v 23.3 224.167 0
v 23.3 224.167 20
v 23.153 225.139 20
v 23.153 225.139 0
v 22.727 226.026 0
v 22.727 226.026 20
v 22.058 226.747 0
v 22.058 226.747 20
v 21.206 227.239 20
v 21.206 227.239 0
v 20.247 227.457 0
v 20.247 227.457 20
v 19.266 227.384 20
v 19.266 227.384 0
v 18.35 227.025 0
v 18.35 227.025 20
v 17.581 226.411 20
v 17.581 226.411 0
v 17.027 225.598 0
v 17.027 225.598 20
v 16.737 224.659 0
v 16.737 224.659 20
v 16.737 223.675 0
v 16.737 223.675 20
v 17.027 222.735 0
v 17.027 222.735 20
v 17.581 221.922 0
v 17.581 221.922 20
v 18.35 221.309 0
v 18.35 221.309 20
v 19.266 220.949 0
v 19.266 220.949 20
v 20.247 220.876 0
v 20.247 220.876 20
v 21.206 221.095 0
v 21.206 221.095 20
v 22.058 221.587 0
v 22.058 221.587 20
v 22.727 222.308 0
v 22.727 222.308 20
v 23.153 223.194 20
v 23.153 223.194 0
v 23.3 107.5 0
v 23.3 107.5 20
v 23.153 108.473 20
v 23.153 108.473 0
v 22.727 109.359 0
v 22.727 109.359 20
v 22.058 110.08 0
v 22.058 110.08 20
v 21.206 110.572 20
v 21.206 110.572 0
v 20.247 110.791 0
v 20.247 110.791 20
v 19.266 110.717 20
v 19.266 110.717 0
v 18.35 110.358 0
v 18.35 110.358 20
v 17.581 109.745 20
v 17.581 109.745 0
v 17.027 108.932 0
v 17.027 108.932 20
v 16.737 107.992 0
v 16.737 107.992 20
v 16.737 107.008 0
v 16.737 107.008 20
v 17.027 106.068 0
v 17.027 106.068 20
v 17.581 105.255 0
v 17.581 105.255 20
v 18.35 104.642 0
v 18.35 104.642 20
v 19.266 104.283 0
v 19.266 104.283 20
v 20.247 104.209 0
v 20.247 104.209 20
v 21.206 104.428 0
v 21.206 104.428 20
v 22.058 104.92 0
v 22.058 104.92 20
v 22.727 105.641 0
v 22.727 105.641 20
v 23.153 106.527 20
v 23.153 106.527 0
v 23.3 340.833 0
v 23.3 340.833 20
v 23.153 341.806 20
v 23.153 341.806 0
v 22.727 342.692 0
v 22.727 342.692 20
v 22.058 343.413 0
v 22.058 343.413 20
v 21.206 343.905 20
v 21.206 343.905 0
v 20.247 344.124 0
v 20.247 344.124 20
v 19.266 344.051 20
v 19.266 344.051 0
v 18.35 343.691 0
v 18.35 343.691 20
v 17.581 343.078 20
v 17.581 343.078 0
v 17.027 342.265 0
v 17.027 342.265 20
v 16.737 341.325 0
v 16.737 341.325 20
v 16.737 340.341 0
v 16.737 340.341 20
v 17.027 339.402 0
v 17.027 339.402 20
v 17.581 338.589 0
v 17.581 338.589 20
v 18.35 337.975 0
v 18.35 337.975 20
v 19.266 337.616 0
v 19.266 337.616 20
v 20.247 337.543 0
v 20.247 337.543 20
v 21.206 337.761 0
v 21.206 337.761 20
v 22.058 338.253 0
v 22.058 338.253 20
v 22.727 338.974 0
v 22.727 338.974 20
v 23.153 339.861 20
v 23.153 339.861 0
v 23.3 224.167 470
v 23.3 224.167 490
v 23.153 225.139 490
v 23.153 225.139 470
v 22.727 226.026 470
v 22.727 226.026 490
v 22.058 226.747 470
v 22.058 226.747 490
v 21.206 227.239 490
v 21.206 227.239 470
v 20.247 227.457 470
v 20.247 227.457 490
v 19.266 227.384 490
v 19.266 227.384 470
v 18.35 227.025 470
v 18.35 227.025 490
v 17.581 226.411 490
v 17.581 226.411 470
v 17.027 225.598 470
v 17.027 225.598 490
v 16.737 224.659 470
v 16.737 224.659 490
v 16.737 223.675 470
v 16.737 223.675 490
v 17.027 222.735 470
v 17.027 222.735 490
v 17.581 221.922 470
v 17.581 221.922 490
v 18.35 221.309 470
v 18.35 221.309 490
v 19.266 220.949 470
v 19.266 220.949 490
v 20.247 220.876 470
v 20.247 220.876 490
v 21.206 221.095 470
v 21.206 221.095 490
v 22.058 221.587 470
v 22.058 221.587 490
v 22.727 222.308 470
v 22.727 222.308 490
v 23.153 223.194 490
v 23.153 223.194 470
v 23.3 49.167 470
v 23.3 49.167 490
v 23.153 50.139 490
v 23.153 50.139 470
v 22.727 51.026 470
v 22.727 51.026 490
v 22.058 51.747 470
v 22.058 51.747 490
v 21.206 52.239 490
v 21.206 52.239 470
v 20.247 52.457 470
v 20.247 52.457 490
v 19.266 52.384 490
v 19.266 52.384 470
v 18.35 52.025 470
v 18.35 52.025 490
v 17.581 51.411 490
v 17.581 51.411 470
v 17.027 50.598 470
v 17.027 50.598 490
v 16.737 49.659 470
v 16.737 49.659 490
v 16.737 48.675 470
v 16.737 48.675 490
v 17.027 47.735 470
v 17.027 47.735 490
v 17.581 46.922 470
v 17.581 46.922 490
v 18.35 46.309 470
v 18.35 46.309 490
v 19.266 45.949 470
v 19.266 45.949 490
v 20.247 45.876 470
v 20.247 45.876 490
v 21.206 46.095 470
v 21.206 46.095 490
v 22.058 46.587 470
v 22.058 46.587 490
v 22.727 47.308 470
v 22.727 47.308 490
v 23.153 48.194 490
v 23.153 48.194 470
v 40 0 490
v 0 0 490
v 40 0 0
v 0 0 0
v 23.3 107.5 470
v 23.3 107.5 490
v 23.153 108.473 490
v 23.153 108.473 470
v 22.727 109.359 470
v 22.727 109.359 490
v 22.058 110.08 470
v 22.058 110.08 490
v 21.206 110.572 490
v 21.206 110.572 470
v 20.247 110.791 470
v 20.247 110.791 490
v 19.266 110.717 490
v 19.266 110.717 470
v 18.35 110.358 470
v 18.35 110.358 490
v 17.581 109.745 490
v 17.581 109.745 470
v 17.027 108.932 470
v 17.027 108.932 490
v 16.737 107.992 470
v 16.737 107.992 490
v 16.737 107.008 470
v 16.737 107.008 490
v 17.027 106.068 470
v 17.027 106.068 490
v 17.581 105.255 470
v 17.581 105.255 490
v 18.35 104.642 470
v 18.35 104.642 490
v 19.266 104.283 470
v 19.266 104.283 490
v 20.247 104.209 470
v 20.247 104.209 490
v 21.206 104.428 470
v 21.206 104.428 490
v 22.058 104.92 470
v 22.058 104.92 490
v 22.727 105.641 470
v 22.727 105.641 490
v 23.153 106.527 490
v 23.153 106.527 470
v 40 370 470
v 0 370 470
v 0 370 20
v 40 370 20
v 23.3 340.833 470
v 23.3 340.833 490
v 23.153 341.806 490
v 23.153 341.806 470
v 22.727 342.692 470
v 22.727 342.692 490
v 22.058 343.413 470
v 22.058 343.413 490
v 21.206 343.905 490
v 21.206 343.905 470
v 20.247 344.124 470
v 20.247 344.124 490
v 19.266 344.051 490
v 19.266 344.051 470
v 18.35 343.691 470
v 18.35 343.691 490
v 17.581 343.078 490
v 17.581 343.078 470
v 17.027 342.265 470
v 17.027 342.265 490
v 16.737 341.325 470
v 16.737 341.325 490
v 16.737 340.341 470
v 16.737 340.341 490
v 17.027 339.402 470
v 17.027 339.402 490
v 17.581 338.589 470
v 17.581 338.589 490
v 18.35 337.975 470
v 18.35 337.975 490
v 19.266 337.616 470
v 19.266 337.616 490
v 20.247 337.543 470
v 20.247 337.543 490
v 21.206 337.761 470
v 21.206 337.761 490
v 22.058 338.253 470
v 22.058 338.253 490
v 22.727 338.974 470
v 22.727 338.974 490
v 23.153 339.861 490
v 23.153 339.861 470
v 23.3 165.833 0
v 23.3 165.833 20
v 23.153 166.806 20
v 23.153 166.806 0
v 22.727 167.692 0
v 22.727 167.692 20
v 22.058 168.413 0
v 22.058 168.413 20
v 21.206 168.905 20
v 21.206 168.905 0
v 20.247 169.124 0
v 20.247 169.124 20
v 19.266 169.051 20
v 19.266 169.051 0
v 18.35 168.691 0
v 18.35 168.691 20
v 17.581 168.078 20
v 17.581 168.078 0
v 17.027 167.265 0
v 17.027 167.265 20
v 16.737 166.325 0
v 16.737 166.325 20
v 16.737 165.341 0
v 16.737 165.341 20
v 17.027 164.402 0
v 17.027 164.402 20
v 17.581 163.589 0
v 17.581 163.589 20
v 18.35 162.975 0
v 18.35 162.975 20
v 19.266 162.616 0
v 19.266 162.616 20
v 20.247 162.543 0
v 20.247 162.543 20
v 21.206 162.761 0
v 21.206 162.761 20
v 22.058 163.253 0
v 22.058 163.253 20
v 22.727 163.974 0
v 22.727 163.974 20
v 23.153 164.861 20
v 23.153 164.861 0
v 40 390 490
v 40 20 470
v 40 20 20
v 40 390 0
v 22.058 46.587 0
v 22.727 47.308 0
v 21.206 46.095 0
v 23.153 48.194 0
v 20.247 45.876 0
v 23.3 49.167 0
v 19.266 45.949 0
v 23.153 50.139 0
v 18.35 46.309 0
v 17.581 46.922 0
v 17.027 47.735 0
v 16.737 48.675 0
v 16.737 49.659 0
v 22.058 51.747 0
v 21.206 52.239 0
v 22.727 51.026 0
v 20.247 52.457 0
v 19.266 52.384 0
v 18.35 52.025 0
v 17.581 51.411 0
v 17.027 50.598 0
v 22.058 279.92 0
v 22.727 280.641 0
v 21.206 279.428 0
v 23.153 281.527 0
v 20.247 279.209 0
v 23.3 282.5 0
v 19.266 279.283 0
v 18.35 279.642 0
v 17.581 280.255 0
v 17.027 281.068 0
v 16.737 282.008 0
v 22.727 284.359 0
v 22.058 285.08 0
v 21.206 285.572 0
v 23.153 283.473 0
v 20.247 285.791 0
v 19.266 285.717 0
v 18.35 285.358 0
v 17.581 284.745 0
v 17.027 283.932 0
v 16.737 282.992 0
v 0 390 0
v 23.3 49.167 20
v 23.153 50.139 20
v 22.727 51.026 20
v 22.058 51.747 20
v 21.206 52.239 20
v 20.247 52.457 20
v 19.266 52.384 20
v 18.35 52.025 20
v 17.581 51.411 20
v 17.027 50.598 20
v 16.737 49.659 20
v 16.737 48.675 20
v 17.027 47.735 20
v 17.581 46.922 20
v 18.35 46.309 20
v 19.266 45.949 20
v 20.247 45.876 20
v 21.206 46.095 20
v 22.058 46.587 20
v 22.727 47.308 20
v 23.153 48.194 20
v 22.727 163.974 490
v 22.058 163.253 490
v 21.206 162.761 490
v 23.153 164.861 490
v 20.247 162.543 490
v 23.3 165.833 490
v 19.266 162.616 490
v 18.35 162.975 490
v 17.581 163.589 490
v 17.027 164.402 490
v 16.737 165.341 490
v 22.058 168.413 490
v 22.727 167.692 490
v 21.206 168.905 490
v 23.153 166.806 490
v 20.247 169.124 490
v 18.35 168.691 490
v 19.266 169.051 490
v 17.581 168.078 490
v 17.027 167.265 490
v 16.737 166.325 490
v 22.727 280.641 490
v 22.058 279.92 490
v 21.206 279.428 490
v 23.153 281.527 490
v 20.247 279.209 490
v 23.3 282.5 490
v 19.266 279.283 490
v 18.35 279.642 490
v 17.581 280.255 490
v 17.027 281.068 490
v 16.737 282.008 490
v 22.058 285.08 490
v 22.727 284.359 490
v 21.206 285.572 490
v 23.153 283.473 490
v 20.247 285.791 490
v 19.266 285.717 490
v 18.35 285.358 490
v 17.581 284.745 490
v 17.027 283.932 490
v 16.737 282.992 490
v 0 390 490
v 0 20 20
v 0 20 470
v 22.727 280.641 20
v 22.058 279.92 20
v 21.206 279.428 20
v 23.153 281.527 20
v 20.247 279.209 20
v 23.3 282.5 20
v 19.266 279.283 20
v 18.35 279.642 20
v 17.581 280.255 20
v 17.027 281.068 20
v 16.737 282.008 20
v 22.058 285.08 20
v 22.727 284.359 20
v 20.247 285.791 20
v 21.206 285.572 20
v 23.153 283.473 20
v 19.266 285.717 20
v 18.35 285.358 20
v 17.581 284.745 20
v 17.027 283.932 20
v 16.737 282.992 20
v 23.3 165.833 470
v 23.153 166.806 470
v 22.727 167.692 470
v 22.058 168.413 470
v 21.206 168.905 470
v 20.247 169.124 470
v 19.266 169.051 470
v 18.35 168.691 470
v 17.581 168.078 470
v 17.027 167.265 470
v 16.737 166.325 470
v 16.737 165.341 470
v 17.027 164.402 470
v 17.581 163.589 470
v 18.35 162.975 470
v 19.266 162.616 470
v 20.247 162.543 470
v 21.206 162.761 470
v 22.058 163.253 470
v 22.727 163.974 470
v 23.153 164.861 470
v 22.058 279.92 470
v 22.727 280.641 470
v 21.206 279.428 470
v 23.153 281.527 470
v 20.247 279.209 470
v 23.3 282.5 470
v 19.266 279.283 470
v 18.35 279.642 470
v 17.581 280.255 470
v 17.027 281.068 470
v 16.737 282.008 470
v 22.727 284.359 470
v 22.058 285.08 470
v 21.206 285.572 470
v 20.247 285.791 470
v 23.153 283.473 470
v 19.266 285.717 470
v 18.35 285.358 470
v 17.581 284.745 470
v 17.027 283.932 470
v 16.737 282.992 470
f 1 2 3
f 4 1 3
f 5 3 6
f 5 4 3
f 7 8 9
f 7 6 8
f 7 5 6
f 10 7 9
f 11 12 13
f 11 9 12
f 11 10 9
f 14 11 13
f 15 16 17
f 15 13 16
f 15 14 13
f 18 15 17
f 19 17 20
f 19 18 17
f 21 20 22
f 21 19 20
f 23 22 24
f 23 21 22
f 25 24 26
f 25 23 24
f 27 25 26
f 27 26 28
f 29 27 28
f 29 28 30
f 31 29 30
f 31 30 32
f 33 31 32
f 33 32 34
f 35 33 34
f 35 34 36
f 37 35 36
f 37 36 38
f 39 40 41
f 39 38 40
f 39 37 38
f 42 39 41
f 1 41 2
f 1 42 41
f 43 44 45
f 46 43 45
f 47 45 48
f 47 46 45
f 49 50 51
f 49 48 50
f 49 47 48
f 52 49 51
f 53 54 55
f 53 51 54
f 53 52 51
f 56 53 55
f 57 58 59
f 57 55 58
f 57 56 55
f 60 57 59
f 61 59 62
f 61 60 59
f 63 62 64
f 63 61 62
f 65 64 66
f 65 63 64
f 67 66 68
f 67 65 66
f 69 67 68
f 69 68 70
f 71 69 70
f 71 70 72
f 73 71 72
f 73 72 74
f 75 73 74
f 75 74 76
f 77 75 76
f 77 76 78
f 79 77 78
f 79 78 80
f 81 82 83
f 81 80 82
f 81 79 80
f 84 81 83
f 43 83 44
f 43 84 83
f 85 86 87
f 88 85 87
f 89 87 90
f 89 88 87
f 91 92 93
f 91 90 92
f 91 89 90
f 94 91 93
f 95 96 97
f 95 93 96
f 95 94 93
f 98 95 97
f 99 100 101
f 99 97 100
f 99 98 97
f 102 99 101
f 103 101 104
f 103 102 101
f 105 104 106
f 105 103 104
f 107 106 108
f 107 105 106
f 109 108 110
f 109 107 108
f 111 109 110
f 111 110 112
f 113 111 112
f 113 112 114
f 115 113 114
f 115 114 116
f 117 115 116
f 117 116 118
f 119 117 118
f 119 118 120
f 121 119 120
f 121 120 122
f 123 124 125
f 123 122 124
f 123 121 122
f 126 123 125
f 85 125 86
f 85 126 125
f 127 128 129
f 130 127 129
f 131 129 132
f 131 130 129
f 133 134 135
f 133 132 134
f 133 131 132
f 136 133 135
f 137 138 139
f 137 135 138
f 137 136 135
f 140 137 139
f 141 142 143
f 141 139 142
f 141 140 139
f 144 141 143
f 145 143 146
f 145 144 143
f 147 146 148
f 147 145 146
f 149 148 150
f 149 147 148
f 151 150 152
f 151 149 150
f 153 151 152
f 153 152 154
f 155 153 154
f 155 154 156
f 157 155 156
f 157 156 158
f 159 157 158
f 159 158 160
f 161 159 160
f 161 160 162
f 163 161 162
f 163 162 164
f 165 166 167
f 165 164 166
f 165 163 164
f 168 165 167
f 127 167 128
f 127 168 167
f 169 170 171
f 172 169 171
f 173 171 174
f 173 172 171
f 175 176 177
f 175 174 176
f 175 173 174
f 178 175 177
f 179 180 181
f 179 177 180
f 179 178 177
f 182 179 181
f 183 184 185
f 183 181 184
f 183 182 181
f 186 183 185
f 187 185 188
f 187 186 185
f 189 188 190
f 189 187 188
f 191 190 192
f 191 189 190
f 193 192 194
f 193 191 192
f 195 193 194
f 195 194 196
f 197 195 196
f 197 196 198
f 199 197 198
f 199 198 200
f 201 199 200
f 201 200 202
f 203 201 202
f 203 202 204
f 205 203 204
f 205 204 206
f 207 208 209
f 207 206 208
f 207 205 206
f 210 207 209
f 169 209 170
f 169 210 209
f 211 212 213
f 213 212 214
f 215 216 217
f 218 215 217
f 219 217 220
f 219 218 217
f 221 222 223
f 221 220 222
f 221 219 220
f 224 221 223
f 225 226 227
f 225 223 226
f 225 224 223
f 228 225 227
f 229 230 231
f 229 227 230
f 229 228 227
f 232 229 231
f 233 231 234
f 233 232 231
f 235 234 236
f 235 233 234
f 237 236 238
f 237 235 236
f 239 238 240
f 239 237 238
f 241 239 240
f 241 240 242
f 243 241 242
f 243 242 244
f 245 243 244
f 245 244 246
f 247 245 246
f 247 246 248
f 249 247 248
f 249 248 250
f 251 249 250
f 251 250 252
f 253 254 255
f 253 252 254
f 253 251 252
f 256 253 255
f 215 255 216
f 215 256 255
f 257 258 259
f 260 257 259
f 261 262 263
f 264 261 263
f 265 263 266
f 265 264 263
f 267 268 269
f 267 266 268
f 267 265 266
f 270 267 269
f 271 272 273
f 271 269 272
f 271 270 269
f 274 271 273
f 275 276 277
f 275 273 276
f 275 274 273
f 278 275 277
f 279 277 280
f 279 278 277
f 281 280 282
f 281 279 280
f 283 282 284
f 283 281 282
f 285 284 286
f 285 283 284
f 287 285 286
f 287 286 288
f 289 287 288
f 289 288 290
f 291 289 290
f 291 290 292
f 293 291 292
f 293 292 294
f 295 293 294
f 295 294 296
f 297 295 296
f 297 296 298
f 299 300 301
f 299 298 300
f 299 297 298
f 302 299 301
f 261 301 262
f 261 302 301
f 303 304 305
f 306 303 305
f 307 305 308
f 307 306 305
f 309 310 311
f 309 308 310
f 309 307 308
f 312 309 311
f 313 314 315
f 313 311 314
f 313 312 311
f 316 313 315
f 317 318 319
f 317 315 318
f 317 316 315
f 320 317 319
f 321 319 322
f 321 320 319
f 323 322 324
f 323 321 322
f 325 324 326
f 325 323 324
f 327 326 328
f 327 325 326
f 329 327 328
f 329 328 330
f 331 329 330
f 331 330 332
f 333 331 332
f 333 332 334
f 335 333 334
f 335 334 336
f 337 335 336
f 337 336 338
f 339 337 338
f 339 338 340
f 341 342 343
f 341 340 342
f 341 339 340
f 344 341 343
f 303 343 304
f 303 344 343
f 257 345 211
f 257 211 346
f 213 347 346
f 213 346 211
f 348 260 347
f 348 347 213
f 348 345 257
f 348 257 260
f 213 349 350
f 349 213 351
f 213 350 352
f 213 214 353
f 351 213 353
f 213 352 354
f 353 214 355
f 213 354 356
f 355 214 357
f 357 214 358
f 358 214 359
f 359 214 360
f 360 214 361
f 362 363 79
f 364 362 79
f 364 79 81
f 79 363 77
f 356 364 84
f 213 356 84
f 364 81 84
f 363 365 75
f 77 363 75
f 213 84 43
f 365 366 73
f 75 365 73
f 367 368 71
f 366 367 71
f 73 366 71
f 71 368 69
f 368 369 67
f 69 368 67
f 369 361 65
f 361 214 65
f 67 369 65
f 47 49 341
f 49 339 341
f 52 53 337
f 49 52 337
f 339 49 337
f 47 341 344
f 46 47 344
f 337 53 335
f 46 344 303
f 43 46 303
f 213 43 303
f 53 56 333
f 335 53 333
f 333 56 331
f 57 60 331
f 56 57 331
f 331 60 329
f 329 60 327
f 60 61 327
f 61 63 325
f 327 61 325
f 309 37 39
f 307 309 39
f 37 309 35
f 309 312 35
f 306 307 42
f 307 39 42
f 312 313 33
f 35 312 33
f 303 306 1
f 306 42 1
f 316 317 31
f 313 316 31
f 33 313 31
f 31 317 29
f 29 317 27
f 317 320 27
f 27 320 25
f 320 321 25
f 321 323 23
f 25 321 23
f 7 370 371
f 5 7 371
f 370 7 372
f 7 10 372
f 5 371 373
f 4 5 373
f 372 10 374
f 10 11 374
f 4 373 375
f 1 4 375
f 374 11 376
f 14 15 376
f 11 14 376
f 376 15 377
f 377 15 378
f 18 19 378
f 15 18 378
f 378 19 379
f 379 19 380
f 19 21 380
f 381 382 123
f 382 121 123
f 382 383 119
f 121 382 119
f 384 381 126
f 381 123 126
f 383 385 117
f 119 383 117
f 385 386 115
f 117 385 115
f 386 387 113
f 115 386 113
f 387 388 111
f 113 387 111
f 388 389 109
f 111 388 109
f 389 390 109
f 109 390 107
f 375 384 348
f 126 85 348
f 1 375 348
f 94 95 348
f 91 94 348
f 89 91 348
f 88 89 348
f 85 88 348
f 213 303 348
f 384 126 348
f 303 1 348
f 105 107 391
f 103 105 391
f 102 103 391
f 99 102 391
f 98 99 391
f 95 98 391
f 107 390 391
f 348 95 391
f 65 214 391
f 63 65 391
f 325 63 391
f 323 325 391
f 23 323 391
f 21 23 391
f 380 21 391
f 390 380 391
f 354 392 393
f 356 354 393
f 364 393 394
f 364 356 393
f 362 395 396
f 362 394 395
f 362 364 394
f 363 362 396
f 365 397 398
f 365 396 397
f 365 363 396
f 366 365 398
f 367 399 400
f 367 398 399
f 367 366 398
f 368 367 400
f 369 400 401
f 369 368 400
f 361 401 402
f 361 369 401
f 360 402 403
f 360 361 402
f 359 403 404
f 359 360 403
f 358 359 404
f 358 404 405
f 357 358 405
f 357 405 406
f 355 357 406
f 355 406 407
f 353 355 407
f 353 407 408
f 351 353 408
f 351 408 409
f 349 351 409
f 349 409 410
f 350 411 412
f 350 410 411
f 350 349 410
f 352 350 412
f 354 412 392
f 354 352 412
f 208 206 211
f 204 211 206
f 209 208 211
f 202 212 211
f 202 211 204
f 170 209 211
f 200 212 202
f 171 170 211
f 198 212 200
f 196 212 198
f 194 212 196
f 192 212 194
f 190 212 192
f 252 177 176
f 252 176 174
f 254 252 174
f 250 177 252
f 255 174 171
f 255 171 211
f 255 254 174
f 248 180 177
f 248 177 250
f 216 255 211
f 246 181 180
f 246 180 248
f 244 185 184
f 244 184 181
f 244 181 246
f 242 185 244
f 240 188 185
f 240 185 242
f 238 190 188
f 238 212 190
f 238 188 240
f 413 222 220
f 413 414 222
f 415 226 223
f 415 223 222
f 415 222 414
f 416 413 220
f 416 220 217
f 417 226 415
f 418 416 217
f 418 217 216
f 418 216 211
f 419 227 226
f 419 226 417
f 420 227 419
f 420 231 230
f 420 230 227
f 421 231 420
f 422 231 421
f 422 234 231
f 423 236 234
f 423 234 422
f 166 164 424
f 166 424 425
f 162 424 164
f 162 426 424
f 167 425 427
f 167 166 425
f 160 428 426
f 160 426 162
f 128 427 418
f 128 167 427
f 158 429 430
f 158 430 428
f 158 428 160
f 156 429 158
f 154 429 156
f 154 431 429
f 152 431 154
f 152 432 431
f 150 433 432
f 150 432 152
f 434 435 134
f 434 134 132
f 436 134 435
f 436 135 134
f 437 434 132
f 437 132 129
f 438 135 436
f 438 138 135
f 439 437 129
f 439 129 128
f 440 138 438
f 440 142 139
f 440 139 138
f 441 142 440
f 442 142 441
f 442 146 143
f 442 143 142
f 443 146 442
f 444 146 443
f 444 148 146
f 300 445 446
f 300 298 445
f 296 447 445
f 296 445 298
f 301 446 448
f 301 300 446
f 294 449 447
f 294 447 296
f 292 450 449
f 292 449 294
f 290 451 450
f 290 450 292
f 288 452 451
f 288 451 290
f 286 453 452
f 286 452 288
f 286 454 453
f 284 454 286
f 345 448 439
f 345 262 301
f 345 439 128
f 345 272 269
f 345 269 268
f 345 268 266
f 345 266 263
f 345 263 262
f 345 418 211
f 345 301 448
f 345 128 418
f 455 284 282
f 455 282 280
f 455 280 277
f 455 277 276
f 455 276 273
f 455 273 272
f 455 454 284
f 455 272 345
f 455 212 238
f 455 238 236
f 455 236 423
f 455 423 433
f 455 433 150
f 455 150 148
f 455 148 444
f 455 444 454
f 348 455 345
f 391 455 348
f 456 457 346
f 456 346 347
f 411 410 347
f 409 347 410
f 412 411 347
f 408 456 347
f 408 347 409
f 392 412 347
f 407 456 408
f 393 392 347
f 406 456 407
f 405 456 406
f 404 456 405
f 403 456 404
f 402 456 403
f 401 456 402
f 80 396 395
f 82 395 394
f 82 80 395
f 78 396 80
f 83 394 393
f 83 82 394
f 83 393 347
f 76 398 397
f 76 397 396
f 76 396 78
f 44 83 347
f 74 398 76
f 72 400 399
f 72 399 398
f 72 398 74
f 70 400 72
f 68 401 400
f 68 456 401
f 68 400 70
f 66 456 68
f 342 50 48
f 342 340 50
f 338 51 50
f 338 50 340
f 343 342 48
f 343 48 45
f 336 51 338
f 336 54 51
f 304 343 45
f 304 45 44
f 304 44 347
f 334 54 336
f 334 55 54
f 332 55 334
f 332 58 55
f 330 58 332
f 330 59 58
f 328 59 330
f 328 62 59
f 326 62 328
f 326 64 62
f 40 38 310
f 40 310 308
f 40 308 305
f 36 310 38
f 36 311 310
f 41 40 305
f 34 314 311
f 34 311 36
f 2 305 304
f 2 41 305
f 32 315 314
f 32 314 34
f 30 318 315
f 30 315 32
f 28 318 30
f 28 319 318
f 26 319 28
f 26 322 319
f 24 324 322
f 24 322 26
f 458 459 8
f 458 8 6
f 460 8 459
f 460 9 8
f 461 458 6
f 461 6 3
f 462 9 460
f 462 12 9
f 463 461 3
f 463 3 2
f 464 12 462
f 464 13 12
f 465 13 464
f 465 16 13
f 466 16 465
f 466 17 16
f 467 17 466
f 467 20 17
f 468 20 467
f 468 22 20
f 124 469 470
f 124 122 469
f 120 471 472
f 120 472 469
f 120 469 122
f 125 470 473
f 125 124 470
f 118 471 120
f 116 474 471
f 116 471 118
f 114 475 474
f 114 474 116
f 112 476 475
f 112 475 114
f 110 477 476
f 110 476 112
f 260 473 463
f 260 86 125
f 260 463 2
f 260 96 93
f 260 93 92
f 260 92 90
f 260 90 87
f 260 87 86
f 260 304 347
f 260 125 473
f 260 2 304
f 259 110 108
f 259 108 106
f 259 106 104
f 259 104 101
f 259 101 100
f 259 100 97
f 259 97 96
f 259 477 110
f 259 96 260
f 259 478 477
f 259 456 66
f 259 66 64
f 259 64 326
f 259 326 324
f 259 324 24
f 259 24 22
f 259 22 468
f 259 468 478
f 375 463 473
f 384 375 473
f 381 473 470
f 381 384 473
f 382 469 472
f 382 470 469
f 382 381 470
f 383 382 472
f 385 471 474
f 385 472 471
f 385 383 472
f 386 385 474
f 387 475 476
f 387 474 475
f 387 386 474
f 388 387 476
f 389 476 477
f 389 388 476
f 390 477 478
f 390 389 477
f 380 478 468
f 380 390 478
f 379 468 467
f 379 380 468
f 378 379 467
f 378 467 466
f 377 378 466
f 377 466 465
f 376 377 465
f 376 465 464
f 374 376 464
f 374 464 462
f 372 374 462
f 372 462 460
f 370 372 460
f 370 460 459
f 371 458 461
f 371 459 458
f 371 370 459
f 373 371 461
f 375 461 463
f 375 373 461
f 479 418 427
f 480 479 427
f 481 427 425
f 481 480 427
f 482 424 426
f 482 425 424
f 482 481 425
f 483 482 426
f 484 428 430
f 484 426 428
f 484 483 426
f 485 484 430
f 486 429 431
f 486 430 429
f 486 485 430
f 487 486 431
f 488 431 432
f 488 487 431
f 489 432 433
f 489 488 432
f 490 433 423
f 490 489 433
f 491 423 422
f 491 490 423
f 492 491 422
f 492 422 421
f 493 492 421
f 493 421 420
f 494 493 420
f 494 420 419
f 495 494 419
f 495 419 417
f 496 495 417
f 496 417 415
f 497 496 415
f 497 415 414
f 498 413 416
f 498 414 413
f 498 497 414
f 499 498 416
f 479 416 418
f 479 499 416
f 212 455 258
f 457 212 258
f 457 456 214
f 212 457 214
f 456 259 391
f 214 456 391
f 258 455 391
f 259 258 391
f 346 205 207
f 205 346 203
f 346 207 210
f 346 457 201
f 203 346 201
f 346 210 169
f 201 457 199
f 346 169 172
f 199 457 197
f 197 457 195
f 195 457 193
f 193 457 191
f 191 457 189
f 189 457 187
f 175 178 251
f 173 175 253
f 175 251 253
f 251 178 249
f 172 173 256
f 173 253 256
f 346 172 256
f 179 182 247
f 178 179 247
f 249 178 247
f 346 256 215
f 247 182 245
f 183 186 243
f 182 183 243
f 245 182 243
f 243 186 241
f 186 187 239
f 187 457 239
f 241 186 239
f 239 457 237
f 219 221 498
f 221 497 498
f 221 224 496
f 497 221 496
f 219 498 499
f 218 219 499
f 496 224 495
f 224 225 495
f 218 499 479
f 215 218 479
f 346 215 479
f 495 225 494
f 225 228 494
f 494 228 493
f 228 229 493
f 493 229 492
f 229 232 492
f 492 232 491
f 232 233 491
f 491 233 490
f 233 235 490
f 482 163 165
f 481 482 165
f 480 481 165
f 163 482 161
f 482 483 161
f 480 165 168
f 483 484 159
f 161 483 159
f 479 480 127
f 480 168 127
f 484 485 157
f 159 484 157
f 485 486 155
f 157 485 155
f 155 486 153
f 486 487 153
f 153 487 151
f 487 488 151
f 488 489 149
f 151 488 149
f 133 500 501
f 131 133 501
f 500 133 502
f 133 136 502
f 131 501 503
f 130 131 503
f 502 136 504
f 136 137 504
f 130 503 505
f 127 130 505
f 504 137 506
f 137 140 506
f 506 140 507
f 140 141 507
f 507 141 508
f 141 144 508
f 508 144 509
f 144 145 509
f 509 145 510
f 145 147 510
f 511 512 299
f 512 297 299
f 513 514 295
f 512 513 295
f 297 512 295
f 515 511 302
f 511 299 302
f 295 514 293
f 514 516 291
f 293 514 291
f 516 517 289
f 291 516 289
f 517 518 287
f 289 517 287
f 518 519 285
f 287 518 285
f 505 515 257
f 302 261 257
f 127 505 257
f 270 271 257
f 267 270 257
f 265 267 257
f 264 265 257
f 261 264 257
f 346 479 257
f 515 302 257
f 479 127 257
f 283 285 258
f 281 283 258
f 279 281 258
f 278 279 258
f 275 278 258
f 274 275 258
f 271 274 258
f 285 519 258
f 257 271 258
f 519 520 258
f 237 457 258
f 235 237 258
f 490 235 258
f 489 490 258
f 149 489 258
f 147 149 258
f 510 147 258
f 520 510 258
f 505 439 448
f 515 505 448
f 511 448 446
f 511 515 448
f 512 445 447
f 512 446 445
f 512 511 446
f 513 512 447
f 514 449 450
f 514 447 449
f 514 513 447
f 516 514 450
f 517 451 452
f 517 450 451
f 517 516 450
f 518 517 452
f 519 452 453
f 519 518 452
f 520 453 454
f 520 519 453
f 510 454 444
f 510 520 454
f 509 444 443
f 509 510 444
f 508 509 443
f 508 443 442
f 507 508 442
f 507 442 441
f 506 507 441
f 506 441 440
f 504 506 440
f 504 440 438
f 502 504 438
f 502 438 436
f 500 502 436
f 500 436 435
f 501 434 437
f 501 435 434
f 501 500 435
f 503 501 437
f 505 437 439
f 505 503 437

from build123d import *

# Parameters (mm, degrees)
SKETCH1_W     = 490
SKETCH1_H     = 390
FRAME_DEPTH   = 40
OPENING_START = -1
SKETCH2_W     = 450
SKETCH2_H     = 350
OPENING_DEPTH = 42
PIVOT_0_START = -1
SKETCH3_R     = 3.3
PIVOT_0_DEPTH = 492
PIVOT_1_START = -1
SKETCH4_R     = 3.3
PIVOT_1_DEPTH = 492
PIVOT_2_START = -1
SKETCH5_R     = 3.3
PIVOT_2_DEPTH = 492
PIVOT_3_START = -1
SKETCH6_R     = 3.3
PIVOT_3_DEPTH = 492
PIVOT_4_START = -1
SKETCH7_R     = 3.3
PIVOT_4_DEPTH = 492
PIVOT_5_START = -1
SKETCH8_R     = 3.3
PIVOT_5_DEPTH = 492


with BuildPart() as part:
    # Sketch1 → frame (new body)
    with BuildSketch(Plane(origin=(0, 0, 0), x_dir=(0, 0, -1), z_dir=(1, 0, 0))):
        with Locations((-245, 195)):
            Rectangle(SKETCH1_W, SKETCH1_H)
    extrude(amount=FRAME_DEPTH)


with BuildPart() as body_2:
    # Sketch2 → opening (new body)
    with BuildSketch(Plane(origin=(0, 0, 0), x_dir=(0, 0, -1), z_dir=(1, 0, 0)).offset(OPENING_START)):
        with Locations((-245, 195)):
            Rectangle(SKETCH2_W, SKETCH2_H)
    extrude(amount=OPENING_DEPTH)


with BuildPart() as part_1:
    add(part.part)

    # Combine1: cut body 2
    add(body_2.part, mode=Mode.SUBTRACT)


with BuildPart() as body_2_2:
    # Sketch3 → pivot_0 (new body)
    with BuildSketch(Plane.XY.offset(PIVOT_0_START)):
        with Locations((20, 49.166666667)):
            Circle(SKETCH3_R)
    extrude(amount=PIVOT_0_DEPTH)


with BuildPart() as part_2:
    add(part_1.part)

    # Combine2: cut body 2 2
    add(body_2_2.part, mode=Mode.SUBTRACT)


with BuildPart() as body_2_3:
    # Sketch4 → pivot_1 (new body)
    with BuildSketch(Plane.XY.offset(PIVOT_1_START)):
        with Locations((20, 107.5)):
            Circle(SKETCH4_R)
    extrude(amount=PIVOT_1_DEPTH)


with BuildPart() as part_3:
    add(part_2.part)

    # Combine3: cut body 2 3
    add(body_2_3.part, mode=Mode.SUBTRACT)


with BuildPart() as body_2_4:
    # Sketch5 → pivot_2 (new body)
    with BuildSketch(Plane.XY.offset(PIVOT_2_START)):
        with Locations((20, 165.833333333)):
            Circle(SKETCH5_R)
    extrude(amount=PIVOT_2_DEPTH)


with BuildPart() as part_4:
    add(part_3.part)

    # Combine4: cut body 2 4
    add(body_2_4.part, mode=Mode.SUBTRACT)


with BuildPart() as body_2_5:
    # Sketch6 → pivot_3 (new body)
    with BuildSketch(Plane.XY.offset(PIVOT_3_START)):
        with Locations((20, 224.166666667)):
            Circle(SKETCH6_R)
    extrude(amount=PIVOT_3_DEPTH)


with BuildPart() as part_5:
    add(part_4.part)

    # Combine5: cut body 2 5
    add(body_2_5.part, mode=Mode.SUBTRACT)


with BuildPart() as body_2_6:
    # Sketch7 → pivot_4 (new body)
    with BuildSketch(Plane.XY.offset(PIVOT_4_START)):
        with Locations((20, 282.5)):
            Circle(SKETCH7_R)
    extrude(amount=PIVOT_4_DEPTH)


with BuildPart() as part_6:
    add(part_5.part)

    # Combine6: cut body 2 6
    add(body_2_6.part, mode=Mode.SUBTRACT)


with BuildPart() as body_2_7:
    # Sketch8 → pivot_5 (new body)
    with BuildSketch(Plane.XY.offset(PIVOT_5_START)):
        with Locations((20, 340.833333333)):
            Circle(SKETCH8_R)
    extrude(amount=PIVOT_5_DEPTH)


with BuildPart() as part_7:
    add(part_6.part)

    # Combine7: cut body 2 7
    add(body_2_7.part, mode=Mode.SUBTRACT)


solid = part_7.part
